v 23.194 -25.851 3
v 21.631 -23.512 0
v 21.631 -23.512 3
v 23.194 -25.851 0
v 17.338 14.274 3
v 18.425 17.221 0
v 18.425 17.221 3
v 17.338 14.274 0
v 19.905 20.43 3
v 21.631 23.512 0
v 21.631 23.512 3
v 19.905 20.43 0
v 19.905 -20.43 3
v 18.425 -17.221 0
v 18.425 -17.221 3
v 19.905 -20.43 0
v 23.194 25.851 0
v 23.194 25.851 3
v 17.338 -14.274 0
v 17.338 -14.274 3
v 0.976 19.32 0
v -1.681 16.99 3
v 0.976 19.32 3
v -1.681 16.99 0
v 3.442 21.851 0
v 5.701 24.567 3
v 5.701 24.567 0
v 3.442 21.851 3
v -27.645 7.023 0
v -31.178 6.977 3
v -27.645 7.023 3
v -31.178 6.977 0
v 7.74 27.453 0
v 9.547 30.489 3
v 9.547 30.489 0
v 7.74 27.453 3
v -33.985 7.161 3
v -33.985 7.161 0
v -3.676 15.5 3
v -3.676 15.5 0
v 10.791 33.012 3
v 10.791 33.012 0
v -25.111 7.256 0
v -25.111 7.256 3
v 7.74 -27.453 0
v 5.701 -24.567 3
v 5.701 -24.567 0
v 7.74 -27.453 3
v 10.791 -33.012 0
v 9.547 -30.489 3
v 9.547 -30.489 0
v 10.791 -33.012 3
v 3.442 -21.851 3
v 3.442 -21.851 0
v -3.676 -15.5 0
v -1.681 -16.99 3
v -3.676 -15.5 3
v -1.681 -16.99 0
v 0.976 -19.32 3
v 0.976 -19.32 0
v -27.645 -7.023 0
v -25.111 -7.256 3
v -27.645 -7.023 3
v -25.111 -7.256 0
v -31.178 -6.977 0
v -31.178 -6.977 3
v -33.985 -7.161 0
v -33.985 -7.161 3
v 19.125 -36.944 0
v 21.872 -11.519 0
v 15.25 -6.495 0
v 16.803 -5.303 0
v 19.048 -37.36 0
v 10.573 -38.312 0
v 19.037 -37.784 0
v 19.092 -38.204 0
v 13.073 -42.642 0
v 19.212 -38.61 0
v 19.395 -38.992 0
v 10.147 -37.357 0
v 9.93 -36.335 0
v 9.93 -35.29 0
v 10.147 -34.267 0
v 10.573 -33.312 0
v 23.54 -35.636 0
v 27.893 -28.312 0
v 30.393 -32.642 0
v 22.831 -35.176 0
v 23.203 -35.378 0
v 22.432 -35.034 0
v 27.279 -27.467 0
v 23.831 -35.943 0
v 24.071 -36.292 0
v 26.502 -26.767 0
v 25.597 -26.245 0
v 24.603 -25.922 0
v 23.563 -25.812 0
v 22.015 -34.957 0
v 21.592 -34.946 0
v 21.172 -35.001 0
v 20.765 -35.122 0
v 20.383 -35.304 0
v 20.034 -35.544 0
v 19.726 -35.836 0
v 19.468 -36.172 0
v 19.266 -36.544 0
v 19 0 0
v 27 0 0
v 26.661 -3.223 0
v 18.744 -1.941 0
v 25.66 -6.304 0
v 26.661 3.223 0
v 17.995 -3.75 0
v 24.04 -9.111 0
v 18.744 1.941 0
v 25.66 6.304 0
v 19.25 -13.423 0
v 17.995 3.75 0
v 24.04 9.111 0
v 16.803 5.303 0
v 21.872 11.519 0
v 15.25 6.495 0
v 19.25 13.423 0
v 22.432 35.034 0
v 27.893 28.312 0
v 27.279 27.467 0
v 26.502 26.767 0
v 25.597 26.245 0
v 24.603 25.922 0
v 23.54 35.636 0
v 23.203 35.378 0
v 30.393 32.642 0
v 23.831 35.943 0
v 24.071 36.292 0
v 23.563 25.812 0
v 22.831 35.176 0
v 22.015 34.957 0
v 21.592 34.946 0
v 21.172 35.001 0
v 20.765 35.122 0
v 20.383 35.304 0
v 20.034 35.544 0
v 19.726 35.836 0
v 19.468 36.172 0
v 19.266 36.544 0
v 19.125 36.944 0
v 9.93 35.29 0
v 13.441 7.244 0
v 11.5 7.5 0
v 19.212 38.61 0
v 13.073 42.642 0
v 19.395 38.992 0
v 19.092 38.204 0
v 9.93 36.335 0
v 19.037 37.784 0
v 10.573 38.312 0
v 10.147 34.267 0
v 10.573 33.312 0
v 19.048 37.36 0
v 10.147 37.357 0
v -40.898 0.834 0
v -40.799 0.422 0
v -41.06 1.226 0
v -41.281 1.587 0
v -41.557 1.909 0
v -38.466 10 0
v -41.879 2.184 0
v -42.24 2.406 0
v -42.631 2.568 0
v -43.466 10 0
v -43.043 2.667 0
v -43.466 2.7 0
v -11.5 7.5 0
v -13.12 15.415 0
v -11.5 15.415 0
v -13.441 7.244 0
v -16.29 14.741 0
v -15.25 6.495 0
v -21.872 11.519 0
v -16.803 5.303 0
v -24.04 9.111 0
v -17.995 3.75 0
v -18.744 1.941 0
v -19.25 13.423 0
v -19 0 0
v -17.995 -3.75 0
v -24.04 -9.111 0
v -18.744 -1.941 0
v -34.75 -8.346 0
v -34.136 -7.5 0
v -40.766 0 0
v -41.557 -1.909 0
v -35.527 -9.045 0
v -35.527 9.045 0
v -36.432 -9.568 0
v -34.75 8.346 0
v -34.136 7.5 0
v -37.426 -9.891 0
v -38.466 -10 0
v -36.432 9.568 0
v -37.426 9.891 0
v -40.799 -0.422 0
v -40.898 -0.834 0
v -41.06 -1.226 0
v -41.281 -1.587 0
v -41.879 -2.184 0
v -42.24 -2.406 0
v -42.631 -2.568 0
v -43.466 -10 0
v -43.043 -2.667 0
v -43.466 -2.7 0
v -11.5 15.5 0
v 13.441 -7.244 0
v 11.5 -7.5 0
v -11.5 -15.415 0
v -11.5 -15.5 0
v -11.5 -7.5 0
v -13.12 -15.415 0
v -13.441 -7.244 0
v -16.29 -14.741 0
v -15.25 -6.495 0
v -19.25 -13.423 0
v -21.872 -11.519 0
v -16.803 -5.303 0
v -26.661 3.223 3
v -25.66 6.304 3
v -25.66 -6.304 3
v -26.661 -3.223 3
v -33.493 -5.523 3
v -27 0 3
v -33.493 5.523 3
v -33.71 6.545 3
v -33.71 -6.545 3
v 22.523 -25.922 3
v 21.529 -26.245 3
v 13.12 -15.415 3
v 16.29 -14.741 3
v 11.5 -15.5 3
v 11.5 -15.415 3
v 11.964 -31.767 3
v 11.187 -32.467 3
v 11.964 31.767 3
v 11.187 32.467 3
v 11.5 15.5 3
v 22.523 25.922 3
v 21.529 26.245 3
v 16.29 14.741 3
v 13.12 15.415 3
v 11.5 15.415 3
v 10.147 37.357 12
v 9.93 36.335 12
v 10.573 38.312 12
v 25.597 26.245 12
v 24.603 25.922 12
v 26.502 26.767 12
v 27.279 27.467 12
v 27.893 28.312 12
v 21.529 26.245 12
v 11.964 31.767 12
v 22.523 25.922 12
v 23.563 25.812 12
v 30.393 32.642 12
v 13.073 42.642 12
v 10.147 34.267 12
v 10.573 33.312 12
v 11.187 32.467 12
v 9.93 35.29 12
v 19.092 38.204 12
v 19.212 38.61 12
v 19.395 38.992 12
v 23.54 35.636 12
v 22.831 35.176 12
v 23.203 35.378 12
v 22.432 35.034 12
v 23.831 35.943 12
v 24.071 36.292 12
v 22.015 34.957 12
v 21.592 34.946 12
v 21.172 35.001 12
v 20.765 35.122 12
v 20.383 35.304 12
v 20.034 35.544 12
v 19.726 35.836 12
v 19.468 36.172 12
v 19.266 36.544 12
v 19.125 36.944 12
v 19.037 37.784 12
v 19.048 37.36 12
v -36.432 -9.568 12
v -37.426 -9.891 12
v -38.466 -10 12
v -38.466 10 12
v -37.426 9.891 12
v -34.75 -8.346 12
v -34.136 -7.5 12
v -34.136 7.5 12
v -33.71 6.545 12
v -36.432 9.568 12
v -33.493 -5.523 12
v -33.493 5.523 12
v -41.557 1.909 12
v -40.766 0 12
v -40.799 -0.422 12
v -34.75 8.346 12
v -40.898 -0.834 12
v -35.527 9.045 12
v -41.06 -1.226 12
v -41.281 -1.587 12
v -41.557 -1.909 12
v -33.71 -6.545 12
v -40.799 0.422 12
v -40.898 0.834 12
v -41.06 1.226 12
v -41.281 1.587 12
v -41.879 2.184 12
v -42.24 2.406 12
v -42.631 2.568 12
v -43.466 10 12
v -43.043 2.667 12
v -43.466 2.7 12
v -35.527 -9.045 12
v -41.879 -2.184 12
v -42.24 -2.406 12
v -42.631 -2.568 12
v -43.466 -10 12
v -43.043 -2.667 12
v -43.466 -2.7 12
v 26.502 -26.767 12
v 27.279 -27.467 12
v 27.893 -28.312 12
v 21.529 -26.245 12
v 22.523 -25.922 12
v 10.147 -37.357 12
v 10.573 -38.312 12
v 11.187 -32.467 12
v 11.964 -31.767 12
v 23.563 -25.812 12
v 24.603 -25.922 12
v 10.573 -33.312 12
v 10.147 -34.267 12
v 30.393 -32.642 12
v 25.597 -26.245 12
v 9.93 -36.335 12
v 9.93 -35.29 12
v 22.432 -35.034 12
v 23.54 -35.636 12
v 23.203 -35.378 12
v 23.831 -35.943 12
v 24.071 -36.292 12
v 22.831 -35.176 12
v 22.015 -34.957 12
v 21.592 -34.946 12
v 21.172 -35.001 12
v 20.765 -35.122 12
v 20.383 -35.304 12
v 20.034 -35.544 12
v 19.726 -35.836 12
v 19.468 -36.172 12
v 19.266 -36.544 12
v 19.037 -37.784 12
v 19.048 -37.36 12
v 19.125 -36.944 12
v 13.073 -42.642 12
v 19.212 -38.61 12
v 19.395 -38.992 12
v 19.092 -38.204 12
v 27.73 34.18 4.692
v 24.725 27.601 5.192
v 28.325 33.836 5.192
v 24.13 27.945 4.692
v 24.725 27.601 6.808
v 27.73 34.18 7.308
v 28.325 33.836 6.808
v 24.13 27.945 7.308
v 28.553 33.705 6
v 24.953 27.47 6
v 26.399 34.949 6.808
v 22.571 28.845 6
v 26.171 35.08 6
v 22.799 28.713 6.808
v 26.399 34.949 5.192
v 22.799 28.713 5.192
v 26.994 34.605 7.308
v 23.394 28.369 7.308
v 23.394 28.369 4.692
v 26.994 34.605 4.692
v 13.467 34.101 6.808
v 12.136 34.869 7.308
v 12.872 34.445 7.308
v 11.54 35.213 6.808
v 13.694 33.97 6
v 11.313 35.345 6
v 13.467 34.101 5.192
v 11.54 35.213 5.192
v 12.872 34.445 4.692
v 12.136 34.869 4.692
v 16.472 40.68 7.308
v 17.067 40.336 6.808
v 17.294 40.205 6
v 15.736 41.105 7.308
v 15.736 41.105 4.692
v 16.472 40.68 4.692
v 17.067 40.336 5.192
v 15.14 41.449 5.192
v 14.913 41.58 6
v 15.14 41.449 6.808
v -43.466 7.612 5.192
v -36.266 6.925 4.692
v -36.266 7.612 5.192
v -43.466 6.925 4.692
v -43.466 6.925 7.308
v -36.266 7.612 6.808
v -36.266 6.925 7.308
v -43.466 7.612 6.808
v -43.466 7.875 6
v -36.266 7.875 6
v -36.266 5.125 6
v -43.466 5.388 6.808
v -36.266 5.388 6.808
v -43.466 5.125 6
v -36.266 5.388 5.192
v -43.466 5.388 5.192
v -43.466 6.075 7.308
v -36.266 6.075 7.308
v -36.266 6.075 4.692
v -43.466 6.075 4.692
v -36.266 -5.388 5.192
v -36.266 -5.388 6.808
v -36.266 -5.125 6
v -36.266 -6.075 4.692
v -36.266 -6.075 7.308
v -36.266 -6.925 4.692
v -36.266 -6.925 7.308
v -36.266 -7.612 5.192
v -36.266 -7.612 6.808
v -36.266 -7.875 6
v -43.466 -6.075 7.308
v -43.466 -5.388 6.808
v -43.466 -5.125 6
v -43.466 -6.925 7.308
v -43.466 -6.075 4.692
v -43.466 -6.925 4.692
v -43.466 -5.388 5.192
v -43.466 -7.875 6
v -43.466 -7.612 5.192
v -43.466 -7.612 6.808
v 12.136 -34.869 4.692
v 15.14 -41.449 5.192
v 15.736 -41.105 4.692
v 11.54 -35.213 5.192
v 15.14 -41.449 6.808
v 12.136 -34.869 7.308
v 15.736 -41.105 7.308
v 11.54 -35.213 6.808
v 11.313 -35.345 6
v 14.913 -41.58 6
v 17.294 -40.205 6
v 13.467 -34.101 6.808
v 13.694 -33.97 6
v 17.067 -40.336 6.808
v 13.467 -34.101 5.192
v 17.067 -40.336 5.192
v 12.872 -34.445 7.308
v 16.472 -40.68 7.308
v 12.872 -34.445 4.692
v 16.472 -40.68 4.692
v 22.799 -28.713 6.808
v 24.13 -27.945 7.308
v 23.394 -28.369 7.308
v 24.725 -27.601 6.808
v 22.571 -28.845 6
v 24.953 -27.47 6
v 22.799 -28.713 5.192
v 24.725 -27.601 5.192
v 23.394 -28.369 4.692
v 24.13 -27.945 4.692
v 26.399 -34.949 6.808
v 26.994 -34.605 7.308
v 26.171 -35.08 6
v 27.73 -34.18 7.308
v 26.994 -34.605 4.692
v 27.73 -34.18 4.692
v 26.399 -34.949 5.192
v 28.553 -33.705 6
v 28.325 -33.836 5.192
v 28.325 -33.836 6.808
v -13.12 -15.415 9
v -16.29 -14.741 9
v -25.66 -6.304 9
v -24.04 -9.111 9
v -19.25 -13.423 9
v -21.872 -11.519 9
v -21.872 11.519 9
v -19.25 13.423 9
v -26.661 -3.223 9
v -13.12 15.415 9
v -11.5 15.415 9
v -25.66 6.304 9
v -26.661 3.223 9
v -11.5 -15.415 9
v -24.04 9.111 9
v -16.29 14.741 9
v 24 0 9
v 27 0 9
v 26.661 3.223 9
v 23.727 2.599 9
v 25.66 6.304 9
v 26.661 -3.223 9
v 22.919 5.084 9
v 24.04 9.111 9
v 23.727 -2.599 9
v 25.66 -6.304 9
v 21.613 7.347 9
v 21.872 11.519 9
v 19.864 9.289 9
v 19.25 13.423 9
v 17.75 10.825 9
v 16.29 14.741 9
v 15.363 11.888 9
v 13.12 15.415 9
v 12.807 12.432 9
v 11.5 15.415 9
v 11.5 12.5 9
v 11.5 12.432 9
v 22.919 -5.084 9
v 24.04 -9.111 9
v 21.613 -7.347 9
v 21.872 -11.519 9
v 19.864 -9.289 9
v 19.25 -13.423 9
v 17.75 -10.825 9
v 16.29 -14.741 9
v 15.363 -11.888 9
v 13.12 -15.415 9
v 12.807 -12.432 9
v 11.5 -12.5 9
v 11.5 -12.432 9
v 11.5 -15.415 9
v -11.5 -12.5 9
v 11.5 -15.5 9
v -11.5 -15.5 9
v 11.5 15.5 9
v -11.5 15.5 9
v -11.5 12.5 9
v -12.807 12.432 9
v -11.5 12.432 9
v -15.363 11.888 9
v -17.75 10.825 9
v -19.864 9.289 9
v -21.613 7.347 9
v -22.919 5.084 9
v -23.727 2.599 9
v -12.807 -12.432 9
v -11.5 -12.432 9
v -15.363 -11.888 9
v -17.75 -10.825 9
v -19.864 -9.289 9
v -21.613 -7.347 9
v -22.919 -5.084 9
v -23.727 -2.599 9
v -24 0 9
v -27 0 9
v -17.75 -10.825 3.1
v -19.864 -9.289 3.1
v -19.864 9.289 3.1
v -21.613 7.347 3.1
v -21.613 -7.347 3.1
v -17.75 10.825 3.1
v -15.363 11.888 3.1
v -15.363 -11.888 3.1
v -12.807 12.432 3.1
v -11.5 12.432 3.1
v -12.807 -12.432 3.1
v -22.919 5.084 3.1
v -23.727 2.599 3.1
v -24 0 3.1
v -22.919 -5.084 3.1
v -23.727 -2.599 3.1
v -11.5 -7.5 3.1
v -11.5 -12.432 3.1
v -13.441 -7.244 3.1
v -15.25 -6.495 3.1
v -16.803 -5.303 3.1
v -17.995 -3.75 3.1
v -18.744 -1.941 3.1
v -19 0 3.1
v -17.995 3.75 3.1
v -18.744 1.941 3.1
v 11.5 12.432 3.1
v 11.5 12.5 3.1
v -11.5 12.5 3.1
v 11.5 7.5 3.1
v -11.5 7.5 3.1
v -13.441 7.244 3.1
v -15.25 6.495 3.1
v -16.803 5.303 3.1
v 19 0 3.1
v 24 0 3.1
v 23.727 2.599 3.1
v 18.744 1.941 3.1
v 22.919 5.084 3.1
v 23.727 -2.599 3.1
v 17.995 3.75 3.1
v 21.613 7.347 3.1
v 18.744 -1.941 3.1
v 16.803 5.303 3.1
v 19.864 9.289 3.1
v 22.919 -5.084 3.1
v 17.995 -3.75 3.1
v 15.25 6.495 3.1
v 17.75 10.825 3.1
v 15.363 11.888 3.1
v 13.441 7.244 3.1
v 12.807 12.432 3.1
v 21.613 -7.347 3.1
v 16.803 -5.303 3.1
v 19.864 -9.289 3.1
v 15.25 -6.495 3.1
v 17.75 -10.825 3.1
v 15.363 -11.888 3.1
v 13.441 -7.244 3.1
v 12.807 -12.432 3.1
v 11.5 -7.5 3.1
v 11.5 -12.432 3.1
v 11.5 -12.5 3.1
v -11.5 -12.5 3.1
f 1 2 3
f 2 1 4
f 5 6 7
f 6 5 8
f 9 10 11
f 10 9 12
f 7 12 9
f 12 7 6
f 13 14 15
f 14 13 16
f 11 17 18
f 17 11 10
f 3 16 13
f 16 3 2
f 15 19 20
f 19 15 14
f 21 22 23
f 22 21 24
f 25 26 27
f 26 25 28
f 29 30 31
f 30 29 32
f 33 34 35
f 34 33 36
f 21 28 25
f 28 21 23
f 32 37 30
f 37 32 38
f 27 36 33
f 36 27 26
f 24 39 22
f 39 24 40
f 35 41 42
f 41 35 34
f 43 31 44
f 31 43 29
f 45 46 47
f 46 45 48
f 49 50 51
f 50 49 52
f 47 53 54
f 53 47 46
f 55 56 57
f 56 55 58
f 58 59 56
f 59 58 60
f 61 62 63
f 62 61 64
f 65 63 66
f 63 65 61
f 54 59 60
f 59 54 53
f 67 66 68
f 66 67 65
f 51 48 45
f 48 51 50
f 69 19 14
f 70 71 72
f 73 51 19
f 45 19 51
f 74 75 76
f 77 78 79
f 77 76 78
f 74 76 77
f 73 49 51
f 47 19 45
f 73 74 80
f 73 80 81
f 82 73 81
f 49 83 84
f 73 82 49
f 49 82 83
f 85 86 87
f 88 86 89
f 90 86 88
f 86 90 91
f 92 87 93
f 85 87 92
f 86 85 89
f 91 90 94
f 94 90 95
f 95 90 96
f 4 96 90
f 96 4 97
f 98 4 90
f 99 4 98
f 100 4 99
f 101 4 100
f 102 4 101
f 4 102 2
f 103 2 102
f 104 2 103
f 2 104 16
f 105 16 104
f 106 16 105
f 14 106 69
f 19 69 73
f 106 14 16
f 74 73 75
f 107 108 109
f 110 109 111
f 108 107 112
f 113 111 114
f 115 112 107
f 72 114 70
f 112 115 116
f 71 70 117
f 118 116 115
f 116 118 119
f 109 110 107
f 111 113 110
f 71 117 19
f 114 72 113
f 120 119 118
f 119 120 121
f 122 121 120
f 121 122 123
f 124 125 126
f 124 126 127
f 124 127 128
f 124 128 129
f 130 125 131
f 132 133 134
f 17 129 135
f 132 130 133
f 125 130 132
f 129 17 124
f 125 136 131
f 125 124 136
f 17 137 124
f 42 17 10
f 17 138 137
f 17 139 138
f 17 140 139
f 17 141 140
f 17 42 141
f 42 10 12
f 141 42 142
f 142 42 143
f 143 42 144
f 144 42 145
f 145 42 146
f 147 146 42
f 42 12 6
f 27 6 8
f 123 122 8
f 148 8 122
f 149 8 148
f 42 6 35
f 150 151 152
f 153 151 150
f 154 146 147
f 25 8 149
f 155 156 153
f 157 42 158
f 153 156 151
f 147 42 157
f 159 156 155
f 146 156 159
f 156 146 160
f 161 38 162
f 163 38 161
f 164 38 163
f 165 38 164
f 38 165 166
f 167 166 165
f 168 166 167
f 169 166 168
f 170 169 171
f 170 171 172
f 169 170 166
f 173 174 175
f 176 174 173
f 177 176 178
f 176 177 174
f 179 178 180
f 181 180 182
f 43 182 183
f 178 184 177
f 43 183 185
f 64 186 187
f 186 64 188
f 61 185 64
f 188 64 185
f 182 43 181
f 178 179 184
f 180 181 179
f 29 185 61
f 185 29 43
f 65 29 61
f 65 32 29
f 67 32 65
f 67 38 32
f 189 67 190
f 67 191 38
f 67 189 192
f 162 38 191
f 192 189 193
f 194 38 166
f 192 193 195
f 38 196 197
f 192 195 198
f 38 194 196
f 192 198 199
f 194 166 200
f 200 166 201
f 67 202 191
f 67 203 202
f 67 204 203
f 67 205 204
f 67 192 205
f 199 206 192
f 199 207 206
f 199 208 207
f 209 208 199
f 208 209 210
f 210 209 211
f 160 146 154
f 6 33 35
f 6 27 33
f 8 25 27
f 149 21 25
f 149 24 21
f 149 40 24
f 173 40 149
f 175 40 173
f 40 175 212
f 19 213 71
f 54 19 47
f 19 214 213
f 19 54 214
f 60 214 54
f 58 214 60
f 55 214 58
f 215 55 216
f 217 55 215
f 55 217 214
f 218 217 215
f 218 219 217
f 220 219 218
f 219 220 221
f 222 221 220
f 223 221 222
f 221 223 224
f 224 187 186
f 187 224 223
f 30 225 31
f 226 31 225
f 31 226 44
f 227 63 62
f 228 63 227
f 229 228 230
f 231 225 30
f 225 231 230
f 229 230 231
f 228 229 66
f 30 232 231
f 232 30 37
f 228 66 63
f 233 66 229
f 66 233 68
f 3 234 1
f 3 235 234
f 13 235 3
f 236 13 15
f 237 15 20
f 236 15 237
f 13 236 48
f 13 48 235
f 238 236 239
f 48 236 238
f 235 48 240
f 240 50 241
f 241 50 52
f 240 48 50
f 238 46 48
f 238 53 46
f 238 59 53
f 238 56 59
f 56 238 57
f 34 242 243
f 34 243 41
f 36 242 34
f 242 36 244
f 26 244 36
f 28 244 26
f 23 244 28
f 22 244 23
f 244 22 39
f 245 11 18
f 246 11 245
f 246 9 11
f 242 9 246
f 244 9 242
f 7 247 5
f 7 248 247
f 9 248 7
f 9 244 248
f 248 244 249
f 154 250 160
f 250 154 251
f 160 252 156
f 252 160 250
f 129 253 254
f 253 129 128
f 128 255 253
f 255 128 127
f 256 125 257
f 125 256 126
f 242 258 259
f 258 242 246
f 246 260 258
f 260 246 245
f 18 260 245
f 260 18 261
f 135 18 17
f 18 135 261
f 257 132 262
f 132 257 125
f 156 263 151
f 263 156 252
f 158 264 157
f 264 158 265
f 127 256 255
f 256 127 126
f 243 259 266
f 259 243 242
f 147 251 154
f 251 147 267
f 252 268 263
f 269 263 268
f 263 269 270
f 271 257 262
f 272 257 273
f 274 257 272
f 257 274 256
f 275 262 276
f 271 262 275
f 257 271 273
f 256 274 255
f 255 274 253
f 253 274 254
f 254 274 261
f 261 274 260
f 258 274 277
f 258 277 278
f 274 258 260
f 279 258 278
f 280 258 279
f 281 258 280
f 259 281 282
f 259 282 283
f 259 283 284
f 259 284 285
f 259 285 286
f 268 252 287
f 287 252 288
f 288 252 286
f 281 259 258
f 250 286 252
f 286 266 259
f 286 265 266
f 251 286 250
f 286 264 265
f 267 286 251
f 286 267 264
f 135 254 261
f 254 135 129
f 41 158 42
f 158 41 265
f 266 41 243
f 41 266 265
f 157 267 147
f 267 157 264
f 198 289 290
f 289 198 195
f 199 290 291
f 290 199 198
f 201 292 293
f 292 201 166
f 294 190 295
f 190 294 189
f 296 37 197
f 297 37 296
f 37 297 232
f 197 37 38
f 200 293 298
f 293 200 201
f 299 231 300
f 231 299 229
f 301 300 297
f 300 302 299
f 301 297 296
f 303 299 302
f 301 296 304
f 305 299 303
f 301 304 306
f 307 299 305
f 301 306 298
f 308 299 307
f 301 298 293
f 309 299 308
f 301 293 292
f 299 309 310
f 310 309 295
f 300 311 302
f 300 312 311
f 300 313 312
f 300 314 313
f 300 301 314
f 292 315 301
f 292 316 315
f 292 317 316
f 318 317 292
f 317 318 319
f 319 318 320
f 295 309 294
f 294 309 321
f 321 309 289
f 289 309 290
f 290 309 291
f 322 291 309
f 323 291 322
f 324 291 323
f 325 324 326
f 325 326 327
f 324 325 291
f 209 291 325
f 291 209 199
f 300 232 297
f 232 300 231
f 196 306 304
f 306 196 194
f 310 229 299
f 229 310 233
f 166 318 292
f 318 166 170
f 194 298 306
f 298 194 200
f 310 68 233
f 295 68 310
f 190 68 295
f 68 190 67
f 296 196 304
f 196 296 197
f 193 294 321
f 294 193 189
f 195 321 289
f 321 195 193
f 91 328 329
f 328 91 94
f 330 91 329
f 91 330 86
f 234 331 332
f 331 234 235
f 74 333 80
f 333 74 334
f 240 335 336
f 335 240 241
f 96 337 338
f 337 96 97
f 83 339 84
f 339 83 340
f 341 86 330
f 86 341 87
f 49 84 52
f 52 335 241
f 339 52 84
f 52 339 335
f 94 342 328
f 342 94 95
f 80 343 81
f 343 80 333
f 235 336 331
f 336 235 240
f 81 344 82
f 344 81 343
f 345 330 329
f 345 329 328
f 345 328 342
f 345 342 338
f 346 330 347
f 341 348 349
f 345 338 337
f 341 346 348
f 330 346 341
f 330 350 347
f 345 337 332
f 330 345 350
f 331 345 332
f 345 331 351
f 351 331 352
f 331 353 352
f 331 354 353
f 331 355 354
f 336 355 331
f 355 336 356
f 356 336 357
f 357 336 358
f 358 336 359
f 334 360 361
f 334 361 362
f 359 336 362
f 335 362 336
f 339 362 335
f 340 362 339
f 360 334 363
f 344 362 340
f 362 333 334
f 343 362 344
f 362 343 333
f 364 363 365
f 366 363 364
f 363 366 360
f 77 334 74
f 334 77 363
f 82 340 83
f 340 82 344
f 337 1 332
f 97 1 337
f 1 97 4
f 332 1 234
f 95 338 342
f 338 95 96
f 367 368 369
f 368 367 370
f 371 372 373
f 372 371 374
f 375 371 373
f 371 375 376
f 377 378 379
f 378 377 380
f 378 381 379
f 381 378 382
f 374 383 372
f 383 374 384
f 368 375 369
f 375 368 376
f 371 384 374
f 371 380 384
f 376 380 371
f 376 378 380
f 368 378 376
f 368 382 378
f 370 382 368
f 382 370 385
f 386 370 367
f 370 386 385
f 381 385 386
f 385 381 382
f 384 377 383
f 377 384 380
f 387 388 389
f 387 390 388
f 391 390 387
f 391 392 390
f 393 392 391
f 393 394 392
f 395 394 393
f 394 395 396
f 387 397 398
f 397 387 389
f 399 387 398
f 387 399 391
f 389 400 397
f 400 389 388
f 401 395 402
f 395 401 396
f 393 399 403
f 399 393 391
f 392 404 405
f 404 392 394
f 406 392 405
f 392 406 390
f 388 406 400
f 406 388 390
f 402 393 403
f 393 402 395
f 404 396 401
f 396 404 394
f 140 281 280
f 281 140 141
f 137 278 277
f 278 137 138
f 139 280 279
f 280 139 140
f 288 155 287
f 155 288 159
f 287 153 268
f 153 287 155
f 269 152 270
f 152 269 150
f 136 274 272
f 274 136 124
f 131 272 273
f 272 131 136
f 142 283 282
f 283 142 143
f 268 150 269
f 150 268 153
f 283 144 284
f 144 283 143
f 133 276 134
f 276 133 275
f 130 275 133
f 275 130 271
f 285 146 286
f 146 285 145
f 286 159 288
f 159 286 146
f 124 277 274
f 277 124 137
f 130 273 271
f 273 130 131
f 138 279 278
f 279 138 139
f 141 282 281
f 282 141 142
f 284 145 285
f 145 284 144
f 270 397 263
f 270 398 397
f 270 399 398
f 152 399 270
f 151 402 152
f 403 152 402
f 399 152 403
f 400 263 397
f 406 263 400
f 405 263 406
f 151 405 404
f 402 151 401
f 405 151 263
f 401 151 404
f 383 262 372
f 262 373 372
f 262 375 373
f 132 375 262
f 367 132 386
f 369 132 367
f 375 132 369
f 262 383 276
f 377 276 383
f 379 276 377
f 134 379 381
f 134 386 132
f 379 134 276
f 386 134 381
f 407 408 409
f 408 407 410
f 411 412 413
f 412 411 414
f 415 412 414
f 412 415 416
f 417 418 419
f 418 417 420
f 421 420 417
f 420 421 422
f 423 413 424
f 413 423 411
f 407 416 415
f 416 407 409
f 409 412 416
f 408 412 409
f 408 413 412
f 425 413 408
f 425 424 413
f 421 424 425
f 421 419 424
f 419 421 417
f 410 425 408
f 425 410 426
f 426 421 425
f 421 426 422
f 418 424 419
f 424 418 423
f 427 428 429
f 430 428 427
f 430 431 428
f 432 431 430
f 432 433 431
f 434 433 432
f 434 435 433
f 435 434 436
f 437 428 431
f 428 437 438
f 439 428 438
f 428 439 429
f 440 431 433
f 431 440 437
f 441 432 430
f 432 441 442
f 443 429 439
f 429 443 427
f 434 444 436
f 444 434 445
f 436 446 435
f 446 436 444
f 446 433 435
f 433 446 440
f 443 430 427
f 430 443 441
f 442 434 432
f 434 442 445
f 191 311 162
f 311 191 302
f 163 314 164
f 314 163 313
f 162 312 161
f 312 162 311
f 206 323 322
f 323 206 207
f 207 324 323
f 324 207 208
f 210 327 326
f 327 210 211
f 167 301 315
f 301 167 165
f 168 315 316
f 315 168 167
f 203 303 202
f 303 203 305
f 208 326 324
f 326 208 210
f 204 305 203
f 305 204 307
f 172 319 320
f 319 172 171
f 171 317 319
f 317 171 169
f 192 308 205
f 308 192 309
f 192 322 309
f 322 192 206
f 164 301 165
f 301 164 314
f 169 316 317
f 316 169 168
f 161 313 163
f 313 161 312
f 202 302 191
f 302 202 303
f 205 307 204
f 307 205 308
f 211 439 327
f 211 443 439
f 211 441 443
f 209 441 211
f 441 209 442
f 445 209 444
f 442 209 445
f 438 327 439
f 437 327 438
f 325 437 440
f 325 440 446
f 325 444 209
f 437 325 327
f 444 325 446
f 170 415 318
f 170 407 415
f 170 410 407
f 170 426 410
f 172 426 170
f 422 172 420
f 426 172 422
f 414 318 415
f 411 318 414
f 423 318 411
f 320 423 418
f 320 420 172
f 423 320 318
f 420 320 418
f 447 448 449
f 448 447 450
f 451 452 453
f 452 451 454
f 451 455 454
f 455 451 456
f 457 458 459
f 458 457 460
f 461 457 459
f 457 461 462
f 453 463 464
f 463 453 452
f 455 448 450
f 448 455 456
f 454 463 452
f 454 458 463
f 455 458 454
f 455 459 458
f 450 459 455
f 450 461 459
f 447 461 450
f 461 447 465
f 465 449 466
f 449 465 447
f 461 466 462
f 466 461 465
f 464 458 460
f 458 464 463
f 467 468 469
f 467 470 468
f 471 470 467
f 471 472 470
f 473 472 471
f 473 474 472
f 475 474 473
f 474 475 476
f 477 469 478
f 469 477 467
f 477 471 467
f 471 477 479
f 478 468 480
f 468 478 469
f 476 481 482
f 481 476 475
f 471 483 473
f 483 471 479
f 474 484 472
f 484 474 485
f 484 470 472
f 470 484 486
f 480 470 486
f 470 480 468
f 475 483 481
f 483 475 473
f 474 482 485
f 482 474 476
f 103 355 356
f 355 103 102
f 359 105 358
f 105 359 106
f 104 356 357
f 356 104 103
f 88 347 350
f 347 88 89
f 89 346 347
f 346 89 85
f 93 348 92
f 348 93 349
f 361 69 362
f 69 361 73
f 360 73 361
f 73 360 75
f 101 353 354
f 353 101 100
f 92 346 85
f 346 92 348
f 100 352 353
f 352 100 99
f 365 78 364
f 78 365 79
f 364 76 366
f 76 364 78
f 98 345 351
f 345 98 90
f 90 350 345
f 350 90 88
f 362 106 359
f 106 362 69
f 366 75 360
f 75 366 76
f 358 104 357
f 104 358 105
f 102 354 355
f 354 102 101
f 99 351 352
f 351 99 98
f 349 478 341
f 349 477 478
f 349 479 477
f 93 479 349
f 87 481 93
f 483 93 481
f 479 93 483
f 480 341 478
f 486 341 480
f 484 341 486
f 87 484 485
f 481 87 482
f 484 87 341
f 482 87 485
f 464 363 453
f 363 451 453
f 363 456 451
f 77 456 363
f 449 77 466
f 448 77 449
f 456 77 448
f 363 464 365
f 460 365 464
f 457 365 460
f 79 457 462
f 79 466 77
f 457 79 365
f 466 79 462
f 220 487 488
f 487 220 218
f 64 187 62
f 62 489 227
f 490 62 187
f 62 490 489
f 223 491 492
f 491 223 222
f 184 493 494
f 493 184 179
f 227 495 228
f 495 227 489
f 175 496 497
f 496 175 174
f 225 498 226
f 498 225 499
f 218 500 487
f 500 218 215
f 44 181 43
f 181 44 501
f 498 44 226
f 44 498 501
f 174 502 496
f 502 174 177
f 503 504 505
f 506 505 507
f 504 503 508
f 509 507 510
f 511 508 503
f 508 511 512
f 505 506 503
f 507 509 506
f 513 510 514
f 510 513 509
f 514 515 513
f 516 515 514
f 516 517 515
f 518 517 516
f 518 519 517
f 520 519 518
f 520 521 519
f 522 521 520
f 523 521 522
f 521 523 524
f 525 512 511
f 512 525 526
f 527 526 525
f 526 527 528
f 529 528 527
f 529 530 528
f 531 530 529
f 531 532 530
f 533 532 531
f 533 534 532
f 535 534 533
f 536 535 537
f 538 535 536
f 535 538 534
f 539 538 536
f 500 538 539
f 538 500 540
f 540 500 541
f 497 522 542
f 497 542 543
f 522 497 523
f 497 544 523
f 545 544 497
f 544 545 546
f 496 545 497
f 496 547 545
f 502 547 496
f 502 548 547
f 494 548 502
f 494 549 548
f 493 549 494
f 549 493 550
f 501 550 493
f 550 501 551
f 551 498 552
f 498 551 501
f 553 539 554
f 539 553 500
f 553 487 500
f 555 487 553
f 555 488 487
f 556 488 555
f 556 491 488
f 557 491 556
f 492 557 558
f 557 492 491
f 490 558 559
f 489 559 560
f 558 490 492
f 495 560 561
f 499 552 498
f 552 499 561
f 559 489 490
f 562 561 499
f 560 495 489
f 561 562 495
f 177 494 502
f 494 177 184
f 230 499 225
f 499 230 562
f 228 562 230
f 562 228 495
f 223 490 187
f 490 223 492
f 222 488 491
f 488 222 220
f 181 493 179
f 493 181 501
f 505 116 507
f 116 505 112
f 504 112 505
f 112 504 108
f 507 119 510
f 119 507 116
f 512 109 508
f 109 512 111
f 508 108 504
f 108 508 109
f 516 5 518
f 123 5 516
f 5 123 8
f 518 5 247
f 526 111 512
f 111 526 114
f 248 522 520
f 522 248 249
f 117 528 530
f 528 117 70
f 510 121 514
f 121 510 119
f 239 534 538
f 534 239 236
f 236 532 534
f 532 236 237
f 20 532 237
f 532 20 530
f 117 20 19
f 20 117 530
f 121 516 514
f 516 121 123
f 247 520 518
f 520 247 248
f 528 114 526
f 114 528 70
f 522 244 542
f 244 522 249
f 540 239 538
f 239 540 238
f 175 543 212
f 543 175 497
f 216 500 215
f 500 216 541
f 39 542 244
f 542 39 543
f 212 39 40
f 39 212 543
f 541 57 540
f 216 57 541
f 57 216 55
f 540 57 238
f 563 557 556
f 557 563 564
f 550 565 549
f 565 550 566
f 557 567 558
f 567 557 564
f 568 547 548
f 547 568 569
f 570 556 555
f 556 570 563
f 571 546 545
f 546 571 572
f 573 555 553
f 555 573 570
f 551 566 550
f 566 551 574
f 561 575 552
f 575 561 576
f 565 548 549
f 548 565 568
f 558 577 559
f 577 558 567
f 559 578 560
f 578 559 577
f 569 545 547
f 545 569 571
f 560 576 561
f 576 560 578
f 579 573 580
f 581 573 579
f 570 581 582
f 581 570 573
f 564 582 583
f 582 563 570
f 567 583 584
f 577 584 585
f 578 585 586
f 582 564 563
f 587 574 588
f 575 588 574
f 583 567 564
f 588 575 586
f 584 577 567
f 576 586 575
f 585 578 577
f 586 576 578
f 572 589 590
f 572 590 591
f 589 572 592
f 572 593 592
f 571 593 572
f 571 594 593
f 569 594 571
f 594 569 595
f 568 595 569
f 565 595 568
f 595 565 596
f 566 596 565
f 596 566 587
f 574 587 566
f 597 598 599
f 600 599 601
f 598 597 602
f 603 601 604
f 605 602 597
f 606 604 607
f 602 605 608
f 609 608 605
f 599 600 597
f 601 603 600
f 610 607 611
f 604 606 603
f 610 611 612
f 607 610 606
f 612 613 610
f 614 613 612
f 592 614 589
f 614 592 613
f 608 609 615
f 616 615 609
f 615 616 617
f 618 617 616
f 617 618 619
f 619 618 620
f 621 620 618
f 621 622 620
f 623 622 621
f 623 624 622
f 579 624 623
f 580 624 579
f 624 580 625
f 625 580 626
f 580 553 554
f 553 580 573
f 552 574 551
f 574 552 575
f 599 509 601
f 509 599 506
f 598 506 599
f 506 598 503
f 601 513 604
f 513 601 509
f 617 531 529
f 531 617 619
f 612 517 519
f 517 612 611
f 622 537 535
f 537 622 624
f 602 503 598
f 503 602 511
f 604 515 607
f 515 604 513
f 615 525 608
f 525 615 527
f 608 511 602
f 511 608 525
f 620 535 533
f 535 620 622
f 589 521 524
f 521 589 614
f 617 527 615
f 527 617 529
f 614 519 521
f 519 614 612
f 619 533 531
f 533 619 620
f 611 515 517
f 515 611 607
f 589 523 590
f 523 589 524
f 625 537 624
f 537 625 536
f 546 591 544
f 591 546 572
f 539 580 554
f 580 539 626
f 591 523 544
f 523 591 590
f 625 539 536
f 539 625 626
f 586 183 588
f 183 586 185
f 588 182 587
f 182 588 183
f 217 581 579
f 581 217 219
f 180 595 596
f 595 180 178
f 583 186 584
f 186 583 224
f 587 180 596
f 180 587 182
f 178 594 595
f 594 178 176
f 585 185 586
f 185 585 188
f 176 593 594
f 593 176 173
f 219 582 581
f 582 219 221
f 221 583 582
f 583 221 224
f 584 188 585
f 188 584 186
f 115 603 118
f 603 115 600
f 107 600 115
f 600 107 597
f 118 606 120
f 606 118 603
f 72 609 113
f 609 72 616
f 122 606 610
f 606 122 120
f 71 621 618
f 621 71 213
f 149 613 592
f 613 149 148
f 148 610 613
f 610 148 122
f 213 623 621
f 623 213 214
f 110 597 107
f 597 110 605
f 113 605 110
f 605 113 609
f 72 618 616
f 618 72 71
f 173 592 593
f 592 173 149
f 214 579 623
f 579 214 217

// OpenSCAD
// file: lib/stepper.scad
smWidth = 42;
smLength = 40;
smScrewHoleOffsets = 31/2;
smCenterDiameter = 22;
smExtra = 1;

module stepperMotor() {
    smCenterHeight = 2;
    smShaftDiameter = 5;
    smShaftLength = 23;
    smScrewDepth = 4.5;
    smScrewDiameter = 3;
    smEdgeTrimOffset = 27;
    module add() {
        translate([-smWidth/2, -smLength, -smWidth/2]) {
            cube([smWidth, smLength, smWidth]);
        }
        rotate([-90, 0, 0]) {
            cylinder(d=smCenterDiameter, h=smCenterHeight, $fn=30);
            cylinder(d=smShaftDiameter, h=smShaftLength, $fn=20);
        }
    }
    module del() {
        for (x = [smScrewHoleOffsets, -smScrewHoleOffsets]) {
            for (z = [smScrewHoleOffsets, -smScrewHoleOffsets]) {
                translate([x, iota, z]) {
                    rotate([90, 0, 0]) {
                        cylinder(d=smScrewDiameter, h=smScrewDepth, $fn=40);
                    }
                }
            }
        }
        for (a = [45, 135, 225, 315]) {
            rotate([0, a, 0]) {
                translate([smEdgeTrimOffset,
                        -smLength-iota, -smWidth/2-iota]) {
                    cube([smWidth, smLength+2*iota, smWidth+2*iota]);
                }
            }
        }

    }
    difference() {
        add();
        del();
    }
}

module stepperMotorHole() {
    smHoleHeight = 20;
    smScrewHoleDiameter = 4;

    widthPlusExtra = smWidth + smExtra;
    lengthPlusExtra = smLength + smExtra/2;

    translate([-smWidth/2, -lengthPlusExtra, -widthPlusExtra/2]) {
        cube([smWidth, lengthPlusExtra, widthPlusExtra]);
    }
    translate([0, -iota, 0]) {
        rotate([-90, 0, 0]) {
            cylinder(d=smCenterDiameter+smExtra, h=smHoleHeight, $fn=40);
        }
    }
    for (x = [smScrewHoleOffsets, -smScrewHoleOffsets]) {
        for (z = [smScrewHoleOffsets, -smScrewHoleOffsets]) {
            translate([x, smHoleHeight-iota, z]) {
                rotate([90, 0, 0]) {
                    cylinder(d=smScrewHoleDiameter, h=smHoleHeight, $fn=40);
                }
            }
        }
    }

}
// file: lib/commonConstants.scad
// A small quantity to keep parts from starting or ending at exactly the
// same location. For example when we create a hole through an object we
// want the object being subtracted to stick slightly past the object being
// subtracted from.
iota = 0.1;


// Length and hole diameter of the #4 x 3/8in Phillips mount screw.
screwLength = 9.3;
screwHoleDiameter = 2.75;
screwHeadDiameter = 6.5;
screwBodyDiameter = 3.4;


// These constants are the basic parameters of the mount plate. They are
// necessary for other components to make their calculations.
mountPlateWidth = 37.6;
mountPlateLength = 51;


// These constants are the basis for the carbon fiber mount points. They are
// necessary for other components to make their calculations.
mountRodDiameter = 5.5;         // A little extra because holes are smaller.
mountThickness = 9;
mountDiameter = mountRodDiameter + 2*mountThickness;


// These constasnts are teh basis for the motor base. They are necessary for
// other components to make their calculations.
motorBaseExtraAxisOffset = 5;
motorBaseTopOffset = sqrt(3)*mountPlateWidth/6 + motorBaseExtraAxisOffset;
motorBaseBottomOffset = mountPlateLength/sqrt(2) + motorBaseTopOffset;
motorBaseBottomRadius = sqrt(pow(motorBaseBottomOffset,2) +
                             pow(mountPlateWidth/2, 2));
mountBaseRodOffsets = motorBaseBottomRadius-mountDiameter/2;
// main file
include <lib/commonConstants.scad>;
include <lib/stepper.scad>;
include <lib/commonMounts.scad>;

batteryTopMount();
